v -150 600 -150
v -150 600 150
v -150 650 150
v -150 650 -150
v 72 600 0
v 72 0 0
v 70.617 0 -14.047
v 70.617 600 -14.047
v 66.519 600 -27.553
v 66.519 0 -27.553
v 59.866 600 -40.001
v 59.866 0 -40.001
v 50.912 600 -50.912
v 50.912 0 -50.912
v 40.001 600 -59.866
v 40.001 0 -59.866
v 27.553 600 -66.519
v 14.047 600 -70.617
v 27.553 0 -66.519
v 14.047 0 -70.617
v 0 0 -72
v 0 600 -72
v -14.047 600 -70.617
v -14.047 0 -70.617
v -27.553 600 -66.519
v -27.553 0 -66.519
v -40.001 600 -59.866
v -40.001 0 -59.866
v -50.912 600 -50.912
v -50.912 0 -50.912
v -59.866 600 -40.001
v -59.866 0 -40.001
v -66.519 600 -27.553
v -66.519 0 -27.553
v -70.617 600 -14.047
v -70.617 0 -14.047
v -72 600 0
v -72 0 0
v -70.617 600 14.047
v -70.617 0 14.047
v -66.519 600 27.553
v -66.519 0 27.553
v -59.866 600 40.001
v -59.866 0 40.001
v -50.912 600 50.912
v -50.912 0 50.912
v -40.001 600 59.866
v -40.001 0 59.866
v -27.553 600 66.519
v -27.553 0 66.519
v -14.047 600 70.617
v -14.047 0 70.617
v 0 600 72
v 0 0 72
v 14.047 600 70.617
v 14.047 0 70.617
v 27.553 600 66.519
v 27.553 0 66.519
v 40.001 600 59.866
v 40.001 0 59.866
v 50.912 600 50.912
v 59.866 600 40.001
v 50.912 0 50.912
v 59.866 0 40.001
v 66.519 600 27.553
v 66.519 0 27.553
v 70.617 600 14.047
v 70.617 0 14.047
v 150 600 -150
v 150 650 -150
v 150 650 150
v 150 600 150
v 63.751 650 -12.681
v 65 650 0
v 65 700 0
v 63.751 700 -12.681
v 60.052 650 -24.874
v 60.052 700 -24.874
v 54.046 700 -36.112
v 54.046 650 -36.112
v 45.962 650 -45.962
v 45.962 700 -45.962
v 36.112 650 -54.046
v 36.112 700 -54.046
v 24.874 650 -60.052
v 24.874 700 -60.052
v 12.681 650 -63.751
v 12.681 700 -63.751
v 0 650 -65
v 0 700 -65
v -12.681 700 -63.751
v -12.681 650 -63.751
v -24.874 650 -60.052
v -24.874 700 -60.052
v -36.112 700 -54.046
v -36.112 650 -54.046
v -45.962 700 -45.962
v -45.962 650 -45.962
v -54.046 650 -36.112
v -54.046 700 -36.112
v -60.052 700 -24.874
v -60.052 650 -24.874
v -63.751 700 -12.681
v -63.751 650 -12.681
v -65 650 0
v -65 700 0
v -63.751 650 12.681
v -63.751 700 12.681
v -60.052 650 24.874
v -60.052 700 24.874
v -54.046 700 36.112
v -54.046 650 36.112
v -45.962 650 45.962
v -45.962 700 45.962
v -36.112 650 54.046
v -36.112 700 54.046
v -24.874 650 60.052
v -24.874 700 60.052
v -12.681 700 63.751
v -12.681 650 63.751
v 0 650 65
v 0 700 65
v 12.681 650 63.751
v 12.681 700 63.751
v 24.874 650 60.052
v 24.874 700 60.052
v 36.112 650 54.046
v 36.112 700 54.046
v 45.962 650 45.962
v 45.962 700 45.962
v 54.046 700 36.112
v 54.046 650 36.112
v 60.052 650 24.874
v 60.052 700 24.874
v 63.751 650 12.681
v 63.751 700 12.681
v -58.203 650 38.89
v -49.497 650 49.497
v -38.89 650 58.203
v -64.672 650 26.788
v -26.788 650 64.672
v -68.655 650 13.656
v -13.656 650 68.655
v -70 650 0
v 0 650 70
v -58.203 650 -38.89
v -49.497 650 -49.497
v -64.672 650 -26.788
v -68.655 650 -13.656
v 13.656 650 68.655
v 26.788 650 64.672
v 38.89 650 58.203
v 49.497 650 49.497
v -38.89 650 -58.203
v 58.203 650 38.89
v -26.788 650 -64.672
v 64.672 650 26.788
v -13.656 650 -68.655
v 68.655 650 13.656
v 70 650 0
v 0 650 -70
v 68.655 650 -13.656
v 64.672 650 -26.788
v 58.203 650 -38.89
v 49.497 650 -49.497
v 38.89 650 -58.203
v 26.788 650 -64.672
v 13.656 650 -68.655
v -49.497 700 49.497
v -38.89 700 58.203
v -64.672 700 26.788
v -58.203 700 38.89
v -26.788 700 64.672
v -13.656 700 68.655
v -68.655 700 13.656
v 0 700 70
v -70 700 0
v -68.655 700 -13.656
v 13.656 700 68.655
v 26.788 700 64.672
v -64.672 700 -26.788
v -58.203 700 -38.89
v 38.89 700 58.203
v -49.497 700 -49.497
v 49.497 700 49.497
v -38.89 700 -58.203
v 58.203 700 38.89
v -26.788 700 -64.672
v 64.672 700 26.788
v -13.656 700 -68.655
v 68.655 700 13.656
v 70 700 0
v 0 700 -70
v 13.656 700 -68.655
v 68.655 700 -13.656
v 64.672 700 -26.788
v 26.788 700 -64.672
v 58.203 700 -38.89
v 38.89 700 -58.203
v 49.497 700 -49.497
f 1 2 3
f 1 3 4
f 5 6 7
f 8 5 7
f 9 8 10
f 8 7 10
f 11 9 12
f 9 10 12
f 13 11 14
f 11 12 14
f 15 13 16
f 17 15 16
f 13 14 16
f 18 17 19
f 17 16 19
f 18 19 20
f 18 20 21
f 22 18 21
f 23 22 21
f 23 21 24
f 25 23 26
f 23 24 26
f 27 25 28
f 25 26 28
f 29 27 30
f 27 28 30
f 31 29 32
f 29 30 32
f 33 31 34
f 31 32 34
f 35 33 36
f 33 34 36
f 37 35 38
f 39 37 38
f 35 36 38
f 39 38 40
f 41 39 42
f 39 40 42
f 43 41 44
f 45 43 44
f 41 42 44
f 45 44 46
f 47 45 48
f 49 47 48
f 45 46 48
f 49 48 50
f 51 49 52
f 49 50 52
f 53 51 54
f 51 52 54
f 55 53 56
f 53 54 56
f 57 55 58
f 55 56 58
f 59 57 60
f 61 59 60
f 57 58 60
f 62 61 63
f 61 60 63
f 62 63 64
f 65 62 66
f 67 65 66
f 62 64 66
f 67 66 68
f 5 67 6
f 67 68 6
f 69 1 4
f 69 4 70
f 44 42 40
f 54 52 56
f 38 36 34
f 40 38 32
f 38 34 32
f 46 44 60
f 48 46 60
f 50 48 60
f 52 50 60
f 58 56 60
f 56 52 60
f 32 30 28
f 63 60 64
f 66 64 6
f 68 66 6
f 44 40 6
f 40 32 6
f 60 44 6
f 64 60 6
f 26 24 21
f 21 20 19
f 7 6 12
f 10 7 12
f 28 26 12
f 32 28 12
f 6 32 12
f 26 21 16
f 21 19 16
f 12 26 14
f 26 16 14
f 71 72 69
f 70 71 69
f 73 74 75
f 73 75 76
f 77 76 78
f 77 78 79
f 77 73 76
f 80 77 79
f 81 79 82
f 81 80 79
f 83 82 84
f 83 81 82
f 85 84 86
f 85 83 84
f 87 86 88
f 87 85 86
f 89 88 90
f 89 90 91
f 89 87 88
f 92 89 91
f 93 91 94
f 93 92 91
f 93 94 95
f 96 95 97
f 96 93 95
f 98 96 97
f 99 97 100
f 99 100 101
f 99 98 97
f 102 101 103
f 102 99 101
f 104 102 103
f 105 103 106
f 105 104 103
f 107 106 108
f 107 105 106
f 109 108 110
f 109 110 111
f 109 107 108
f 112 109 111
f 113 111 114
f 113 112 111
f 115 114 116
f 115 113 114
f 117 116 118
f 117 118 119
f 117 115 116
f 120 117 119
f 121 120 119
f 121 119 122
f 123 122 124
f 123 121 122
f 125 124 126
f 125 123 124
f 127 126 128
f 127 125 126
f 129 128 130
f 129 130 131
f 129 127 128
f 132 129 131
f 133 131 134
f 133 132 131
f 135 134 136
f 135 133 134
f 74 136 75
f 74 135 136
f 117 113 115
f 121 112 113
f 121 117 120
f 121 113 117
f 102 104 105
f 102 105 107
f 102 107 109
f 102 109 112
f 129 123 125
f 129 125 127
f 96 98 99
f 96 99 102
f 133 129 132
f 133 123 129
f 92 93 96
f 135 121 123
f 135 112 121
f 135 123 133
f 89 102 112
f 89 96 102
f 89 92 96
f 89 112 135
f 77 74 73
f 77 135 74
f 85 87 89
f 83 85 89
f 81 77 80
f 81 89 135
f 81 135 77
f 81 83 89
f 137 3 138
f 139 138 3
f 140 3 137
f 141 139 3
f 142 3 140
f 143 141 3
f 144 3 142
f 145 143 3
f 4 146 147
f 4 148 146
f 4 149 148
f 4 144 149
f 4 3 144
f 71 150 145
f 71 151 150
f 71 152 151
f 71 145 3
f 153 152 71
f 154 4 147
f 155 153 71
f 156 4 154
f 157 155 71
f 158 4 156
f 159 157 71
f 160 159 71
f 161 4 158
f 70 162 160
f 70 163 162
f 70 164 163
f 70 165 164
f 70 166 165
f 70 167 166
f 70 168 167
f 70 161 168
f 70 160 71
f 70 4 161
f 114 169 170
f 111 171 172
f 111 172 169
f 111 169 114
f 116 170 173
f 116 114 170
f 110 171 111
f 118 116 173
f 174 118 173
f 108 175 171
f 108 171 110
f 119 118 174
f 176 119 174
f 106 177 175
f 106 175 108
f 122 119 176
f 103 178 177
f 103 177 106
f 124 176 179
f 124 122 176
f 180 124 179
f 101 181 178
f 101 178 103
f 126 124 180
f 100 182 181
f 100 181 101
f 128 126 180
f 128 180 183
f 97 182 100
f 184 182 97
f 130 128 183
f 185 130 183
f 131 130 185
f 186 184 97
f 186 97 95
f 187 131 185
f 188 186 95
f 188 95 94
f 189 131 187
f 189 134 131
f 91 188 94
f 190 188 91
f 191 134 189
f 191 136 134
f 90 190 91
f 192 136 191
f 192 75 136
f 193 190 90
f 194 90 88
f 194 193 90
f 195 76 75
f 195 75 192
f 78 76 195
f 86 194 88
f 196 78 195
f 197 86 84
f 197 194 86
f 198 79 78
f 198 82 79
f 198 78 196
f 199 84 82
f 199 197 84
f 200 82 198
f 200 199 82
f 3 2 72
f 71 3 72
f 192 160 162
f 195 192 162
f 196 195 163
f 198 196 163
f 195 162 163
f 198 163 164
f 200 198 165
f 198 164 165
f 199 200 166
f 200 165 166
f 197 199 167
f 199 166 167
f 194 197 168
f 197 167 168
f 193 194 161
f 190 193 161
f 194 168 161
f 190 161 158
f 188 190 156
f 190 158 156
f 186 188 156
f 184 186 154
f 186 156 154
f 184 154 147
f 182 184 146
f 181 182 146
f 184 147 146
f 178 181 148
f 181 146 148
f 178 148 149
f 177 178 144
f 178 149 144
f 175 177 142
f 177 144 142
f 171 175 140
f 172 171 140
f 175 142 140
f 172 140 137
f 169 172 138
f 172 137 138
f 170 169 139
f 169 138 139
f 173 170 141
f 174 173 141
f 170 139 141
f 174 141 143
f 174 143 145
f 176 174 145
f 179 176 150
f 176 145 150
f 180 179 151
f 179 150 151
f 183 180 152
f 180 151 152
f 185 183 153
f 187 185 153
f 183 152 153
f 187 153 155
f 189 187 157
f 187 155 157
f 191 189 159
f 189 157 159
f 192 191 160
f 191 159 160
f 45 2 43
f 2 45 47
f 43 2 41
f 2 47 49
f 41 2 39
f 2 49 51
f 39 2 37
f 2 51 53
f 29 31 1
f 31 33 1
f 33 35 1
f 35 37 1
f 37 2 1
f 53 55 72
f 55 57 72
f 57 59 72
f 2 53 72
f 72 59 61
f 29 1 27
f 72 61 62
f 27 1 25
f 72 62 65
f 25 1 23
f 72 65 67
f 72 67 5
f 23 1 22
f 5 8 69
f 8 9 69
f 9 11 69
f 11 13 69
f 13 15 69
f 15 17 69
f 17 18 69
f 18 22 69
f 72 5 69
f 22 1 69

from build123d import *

# Parameters (mm, degrees)
SKETCH1_R           = 72
BOSS_EXTRUDE1_DEPTH = 600
SKETCH2_W           = 300
SKETCH2_H           = 300
BOSS_EXTRUDE2_DEPTH = 50
SKETCH3_R           = 70
SKETCH3_R_2         = 65
BOSS_EXTRUDE3_DEPTH = 50


with BuildPart() as part:
    # Sketch1 → Boss-Extrude1 (new body)
    with BuildSketch(Plane(origin=(0, 0, 0), x_dir=(1, 0, 0), z_dir=(0, 1, 0))):
        Circle(SKETCH1_R)
    extrude(amount=BOSS_EXTRUDE1_DEPTH)

    # Sketch2 → Boss-Extrude2 (add)
    with BuildSketch(Plane(origin=(0, 600, 0), x_dir=(1, 0, 0), z_dir=(0, 1, 0))):
        Rectangle(SKETCH2_W, SKETCH2_H)
    extrude(amount=BOSS_EXTRUDE2_DEPTH)

    # Sketch3 → Boss-Extrude3 (add)
    with BuildSketch(Plane(origin=(0, 650, 0), x_dir=(1, 0, 0), z_dir=(0, 1, 0))):
        Circle(SKETCH3_R)
        Circle(SKETCH3_R_2, mode=Mode.SUBTRACT)
    extrude(amount=BOSS_EXTRUDE3_DEPTH)


solid = part.part
